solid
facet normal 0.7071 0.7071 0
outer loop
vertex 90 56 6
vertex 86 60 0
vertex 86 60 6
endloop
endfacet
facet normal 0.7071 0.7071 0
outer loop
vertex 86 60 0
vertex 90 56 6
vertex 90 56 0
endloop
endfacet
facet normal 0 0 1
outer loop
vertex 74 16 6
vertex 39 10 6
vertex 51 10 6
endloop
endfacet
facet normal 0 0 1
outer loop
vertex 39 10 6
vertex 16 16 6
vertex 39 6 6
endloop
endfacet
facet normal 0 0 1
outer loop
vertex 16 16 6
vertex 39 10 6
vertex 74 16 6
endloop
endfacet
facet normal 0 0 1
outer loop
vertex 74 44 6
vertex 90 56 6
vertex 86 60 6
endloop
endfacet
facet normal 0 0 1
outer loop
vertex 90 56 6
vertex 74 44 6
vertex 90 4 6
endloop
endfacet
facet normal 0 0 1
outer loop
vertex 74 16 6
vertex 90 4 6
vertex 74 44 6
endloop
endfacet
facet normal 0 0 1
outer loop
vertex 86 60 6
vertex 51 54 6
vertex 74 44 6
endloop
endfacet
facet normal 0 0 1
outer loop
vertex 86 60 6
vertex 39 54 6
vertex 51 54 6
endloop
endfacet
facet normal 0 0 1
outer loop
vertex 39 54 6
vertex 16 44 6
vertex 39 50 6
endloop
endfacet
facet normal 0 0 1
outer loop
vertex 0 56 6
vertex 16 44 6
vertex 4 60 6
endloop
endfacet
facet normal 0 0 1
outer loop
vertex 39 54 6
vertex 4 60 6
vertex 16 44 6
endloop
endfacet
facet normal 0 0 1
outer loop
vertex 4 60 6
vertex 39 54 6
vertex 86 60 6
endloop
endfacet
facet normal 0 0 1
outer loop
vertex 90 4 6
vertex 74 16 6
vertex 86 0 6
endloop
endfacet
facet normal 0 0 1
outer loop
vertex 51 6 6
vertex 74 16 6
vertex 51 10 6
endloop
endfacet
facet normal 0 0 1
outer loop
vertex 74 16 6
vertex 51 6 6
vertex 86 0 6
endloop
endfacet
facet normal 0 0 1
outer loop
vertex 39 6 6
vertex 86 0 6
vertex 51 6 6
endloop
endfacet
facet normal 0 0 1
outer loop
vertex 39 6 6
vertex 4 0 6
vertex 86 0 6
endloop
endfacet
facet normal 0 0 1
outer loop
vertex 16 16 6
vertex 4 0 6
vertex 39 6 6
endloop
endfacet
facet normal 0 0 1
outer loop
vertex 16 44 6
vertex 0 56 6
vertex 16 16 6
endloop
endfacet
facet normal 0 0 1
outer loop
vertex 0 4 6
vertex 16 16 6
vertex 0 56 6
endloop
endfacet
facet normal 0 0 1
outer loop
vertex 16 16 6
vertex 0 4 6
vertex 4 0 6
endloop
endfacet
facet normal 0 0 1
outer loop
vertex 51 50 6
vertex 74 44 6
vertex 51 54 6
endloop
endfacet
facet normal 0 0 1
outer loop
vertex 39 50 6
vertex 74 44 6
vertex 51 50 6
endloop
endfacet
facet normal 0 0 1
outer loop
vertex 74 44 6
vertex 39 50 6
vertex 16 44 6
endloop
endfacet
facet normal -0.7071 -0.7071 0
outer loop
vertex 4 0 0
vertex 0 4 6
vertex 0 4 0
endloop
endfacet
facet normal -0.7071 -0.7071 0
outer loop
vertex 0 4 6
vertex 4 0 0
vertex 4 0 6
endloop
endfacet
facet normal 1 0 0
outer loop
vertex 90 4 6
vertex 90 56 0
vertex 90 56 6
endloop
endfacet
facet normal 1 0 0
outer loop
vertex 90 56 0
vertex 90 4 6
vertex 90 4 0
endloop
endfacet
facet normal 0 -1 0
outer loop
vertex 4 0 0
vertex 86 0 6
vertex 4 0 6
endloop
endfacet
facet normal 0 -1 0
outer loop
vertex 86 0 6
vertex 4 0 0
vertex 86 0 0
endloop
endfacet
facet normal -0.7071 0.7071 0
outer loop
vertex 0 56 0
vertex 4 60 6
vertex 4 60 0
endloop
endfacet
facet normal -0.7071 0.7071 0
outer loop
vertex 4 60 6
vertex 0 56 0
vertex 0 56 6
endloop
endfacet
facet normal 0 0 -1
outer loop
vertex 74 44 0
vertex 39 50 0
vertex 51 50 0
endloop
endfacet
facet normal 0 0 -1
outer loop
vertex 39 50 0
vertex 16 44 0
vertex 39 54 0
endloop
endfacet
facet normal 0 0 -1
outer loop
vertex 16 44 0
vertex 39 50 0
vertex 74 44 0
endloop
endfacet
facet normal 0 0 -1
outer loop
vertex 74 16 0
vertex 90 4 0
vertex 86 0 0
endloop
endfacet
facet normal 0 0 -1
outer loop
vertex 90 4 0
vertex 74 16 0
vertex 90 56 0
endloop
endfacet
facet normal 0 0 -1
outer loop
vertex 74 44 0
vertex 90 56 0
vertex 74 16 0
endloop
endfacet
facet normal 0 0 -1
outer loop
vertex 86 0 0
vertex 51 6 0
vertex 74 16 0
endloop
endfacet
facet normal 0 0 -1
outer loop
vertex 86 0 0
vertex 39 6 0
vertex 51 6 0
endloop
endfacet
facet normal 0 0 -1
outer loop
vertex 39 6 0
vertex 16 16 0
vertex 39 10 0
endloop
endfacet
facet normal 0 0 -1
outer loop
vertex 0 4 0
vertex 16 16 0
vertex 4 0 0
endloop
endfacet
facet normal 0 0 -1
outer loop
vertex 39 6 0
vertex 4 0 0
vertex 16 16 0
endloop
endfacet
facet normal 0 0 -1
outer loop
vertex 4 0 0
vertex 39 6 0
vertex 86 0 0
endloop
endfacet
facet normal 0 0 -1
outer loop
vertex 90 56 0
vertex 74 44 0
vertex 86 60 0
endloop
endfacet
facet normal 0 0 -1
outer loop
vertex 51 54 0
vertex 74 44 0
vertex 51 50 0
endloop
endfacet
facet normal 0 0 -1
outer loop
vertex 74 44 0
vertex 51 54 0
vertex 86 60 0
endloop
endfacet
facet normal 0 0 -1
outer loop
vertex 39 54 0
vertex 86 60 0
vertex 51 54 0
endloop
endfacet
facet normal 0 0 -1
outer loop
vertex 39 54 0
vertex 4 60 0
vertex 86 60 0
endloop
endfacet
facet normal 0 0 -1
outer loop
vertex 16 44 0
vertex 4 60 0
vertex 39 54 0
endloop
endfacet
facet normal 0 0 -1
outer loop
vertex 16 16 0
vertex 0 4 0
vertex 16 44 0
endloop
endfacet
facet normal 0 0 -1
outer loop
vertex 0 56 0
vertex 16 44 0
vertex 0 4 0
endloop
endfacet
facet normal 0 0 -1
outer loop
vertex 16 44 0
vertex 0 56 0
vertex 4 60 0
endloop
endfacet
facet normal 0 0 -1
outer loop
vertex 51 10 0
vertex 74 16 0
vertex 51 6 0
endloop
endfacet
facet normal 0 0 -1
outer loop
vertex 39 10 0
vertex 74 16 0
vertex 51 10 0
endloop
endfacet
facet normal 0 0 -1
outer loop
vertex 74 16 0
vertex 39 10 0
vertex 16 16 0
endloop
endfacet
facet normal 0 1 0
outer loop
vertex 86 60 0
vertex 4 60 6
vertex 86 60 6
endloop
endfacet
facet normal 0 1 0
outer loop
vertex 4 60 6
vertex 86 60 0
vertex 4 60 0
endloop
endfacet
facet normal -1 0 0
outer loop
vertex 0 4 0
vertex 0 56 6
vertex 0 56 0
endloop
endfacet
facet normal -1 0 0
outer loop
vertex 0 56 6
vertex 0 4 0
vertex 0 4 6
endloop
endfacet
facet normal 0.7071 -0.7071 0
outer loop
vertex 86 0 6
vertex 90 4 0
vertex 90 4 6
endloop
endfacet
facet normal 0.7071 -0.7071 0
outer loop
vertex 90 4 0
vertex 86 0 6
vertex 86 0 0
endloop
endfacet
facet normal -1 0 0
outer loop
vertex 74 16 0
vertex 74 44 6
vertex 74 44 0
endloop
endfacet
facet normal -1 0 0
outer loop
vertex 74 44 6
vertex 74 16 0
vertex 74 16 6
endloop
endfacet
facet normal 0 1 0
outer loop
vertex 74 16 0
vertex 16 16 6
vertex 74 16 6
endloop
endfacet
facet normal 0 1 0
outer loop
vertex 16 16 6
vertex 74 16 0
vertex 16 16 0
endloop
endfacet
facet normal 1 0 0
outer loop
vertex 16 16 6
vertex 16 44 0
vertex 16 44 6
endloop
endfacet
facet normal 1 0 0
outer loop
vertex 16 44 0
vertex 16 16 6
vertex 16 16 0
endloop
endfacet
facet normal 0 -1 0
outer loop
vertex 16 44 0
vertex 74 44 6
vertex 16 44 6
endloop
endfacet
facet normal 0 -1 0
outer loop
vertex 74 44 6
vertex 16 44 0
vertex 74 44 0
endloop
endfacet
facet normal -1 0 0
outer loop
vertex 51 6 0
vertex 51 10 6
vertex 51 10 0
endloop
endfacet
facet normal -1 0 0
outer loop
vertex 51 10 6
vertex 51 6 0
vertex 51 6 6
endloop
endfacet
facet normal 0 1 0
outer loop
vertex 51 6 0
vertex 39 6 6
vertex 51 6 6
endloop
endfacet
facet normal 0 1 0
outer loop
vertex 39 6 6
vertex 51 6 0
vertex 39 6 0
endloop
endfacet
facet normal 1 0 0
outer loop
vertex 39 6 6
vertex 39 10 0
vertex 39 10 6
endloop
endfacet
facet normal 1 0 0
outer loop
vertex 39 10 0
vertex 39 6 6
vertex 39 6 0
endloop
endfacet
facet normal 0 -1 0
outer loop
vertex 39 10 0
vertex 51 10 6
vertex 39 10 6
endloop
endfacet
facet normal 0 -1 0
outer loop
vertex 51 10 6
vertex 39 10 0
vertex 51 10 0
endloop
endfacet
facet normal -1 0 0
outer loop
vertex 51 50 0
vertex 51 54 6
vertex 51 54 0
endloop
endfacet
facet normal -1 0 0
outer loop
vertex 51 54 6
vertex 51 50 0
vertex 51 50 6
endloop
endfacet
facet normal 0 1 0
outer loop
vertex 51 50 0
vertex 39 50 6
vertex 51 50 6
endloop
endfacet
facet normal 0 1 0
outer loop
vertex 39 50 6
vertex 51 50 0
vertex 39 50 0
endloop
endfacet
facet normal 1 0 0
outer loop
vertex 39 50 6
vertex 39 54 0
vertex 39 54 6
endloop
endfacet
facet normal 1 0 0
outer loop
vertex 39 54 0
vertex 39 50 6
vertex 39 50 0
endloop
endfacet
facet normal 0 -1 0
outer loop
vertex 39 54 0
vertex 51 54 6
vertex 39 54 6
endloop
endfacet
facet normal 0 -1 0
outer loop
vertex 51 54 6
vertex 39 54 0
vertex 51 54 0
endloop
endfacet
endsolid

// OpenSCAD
$fn = 32;

// ----------------------------------------------------------------------
// Frame plate: 90 x 60 frame, 16 mm rails
// ----------------------------------------------------------------------

// --- parameters (mm) ---
plate_l = 90;             // plate length, X
plate_w = 60;             // plate width, Y
plate_t = 6;              // plate thickness, Z (extrusion height)
corner_c = 4;             // corner chamfer
frame_bar = 16;           // frame rail width
slot_l = 12;              // adjustment slot length
slot_w = 4;               // adjustment slot width

win_l = plate_l - 2 * frame_bar;  // window length
win_w = plate_w - 2 * frame_bar;  // window width

profile = [[4, 0], [86, 0], [90, 4], [90, 56], [86, 60], [4, 60], [0, 56], [0, 4]];  // primary outline, 8 points, counter clockwise
void_1 = [[16, 16], [74, 16], [74, 44], [16, 44]];  // the window, 4 points
void_2 = [[39, 6], [51, 6], [51, 10], [39, 10]];  // adjustment slot, 4 points
void_3 = [[39, 50], [51, 50], [51, 54], [39, 54]];  // adjustment slot, 4 points

// --- the one profile operation ---
difference() {
  linear_extrude(height = plate_t) polygon(points = profile);
  translate([0, 0, -1])
    linear_extrude(height = plate_t + 2) polygon(points = void_1);
  translate([0, 0, -1])
    linear_extrude(height = plate_t + 2) polygon(points = void_2);
  translate([0, 0, -1])
    linear_extrude(height = plate_t + 2) polygon(points = void_3);
}
